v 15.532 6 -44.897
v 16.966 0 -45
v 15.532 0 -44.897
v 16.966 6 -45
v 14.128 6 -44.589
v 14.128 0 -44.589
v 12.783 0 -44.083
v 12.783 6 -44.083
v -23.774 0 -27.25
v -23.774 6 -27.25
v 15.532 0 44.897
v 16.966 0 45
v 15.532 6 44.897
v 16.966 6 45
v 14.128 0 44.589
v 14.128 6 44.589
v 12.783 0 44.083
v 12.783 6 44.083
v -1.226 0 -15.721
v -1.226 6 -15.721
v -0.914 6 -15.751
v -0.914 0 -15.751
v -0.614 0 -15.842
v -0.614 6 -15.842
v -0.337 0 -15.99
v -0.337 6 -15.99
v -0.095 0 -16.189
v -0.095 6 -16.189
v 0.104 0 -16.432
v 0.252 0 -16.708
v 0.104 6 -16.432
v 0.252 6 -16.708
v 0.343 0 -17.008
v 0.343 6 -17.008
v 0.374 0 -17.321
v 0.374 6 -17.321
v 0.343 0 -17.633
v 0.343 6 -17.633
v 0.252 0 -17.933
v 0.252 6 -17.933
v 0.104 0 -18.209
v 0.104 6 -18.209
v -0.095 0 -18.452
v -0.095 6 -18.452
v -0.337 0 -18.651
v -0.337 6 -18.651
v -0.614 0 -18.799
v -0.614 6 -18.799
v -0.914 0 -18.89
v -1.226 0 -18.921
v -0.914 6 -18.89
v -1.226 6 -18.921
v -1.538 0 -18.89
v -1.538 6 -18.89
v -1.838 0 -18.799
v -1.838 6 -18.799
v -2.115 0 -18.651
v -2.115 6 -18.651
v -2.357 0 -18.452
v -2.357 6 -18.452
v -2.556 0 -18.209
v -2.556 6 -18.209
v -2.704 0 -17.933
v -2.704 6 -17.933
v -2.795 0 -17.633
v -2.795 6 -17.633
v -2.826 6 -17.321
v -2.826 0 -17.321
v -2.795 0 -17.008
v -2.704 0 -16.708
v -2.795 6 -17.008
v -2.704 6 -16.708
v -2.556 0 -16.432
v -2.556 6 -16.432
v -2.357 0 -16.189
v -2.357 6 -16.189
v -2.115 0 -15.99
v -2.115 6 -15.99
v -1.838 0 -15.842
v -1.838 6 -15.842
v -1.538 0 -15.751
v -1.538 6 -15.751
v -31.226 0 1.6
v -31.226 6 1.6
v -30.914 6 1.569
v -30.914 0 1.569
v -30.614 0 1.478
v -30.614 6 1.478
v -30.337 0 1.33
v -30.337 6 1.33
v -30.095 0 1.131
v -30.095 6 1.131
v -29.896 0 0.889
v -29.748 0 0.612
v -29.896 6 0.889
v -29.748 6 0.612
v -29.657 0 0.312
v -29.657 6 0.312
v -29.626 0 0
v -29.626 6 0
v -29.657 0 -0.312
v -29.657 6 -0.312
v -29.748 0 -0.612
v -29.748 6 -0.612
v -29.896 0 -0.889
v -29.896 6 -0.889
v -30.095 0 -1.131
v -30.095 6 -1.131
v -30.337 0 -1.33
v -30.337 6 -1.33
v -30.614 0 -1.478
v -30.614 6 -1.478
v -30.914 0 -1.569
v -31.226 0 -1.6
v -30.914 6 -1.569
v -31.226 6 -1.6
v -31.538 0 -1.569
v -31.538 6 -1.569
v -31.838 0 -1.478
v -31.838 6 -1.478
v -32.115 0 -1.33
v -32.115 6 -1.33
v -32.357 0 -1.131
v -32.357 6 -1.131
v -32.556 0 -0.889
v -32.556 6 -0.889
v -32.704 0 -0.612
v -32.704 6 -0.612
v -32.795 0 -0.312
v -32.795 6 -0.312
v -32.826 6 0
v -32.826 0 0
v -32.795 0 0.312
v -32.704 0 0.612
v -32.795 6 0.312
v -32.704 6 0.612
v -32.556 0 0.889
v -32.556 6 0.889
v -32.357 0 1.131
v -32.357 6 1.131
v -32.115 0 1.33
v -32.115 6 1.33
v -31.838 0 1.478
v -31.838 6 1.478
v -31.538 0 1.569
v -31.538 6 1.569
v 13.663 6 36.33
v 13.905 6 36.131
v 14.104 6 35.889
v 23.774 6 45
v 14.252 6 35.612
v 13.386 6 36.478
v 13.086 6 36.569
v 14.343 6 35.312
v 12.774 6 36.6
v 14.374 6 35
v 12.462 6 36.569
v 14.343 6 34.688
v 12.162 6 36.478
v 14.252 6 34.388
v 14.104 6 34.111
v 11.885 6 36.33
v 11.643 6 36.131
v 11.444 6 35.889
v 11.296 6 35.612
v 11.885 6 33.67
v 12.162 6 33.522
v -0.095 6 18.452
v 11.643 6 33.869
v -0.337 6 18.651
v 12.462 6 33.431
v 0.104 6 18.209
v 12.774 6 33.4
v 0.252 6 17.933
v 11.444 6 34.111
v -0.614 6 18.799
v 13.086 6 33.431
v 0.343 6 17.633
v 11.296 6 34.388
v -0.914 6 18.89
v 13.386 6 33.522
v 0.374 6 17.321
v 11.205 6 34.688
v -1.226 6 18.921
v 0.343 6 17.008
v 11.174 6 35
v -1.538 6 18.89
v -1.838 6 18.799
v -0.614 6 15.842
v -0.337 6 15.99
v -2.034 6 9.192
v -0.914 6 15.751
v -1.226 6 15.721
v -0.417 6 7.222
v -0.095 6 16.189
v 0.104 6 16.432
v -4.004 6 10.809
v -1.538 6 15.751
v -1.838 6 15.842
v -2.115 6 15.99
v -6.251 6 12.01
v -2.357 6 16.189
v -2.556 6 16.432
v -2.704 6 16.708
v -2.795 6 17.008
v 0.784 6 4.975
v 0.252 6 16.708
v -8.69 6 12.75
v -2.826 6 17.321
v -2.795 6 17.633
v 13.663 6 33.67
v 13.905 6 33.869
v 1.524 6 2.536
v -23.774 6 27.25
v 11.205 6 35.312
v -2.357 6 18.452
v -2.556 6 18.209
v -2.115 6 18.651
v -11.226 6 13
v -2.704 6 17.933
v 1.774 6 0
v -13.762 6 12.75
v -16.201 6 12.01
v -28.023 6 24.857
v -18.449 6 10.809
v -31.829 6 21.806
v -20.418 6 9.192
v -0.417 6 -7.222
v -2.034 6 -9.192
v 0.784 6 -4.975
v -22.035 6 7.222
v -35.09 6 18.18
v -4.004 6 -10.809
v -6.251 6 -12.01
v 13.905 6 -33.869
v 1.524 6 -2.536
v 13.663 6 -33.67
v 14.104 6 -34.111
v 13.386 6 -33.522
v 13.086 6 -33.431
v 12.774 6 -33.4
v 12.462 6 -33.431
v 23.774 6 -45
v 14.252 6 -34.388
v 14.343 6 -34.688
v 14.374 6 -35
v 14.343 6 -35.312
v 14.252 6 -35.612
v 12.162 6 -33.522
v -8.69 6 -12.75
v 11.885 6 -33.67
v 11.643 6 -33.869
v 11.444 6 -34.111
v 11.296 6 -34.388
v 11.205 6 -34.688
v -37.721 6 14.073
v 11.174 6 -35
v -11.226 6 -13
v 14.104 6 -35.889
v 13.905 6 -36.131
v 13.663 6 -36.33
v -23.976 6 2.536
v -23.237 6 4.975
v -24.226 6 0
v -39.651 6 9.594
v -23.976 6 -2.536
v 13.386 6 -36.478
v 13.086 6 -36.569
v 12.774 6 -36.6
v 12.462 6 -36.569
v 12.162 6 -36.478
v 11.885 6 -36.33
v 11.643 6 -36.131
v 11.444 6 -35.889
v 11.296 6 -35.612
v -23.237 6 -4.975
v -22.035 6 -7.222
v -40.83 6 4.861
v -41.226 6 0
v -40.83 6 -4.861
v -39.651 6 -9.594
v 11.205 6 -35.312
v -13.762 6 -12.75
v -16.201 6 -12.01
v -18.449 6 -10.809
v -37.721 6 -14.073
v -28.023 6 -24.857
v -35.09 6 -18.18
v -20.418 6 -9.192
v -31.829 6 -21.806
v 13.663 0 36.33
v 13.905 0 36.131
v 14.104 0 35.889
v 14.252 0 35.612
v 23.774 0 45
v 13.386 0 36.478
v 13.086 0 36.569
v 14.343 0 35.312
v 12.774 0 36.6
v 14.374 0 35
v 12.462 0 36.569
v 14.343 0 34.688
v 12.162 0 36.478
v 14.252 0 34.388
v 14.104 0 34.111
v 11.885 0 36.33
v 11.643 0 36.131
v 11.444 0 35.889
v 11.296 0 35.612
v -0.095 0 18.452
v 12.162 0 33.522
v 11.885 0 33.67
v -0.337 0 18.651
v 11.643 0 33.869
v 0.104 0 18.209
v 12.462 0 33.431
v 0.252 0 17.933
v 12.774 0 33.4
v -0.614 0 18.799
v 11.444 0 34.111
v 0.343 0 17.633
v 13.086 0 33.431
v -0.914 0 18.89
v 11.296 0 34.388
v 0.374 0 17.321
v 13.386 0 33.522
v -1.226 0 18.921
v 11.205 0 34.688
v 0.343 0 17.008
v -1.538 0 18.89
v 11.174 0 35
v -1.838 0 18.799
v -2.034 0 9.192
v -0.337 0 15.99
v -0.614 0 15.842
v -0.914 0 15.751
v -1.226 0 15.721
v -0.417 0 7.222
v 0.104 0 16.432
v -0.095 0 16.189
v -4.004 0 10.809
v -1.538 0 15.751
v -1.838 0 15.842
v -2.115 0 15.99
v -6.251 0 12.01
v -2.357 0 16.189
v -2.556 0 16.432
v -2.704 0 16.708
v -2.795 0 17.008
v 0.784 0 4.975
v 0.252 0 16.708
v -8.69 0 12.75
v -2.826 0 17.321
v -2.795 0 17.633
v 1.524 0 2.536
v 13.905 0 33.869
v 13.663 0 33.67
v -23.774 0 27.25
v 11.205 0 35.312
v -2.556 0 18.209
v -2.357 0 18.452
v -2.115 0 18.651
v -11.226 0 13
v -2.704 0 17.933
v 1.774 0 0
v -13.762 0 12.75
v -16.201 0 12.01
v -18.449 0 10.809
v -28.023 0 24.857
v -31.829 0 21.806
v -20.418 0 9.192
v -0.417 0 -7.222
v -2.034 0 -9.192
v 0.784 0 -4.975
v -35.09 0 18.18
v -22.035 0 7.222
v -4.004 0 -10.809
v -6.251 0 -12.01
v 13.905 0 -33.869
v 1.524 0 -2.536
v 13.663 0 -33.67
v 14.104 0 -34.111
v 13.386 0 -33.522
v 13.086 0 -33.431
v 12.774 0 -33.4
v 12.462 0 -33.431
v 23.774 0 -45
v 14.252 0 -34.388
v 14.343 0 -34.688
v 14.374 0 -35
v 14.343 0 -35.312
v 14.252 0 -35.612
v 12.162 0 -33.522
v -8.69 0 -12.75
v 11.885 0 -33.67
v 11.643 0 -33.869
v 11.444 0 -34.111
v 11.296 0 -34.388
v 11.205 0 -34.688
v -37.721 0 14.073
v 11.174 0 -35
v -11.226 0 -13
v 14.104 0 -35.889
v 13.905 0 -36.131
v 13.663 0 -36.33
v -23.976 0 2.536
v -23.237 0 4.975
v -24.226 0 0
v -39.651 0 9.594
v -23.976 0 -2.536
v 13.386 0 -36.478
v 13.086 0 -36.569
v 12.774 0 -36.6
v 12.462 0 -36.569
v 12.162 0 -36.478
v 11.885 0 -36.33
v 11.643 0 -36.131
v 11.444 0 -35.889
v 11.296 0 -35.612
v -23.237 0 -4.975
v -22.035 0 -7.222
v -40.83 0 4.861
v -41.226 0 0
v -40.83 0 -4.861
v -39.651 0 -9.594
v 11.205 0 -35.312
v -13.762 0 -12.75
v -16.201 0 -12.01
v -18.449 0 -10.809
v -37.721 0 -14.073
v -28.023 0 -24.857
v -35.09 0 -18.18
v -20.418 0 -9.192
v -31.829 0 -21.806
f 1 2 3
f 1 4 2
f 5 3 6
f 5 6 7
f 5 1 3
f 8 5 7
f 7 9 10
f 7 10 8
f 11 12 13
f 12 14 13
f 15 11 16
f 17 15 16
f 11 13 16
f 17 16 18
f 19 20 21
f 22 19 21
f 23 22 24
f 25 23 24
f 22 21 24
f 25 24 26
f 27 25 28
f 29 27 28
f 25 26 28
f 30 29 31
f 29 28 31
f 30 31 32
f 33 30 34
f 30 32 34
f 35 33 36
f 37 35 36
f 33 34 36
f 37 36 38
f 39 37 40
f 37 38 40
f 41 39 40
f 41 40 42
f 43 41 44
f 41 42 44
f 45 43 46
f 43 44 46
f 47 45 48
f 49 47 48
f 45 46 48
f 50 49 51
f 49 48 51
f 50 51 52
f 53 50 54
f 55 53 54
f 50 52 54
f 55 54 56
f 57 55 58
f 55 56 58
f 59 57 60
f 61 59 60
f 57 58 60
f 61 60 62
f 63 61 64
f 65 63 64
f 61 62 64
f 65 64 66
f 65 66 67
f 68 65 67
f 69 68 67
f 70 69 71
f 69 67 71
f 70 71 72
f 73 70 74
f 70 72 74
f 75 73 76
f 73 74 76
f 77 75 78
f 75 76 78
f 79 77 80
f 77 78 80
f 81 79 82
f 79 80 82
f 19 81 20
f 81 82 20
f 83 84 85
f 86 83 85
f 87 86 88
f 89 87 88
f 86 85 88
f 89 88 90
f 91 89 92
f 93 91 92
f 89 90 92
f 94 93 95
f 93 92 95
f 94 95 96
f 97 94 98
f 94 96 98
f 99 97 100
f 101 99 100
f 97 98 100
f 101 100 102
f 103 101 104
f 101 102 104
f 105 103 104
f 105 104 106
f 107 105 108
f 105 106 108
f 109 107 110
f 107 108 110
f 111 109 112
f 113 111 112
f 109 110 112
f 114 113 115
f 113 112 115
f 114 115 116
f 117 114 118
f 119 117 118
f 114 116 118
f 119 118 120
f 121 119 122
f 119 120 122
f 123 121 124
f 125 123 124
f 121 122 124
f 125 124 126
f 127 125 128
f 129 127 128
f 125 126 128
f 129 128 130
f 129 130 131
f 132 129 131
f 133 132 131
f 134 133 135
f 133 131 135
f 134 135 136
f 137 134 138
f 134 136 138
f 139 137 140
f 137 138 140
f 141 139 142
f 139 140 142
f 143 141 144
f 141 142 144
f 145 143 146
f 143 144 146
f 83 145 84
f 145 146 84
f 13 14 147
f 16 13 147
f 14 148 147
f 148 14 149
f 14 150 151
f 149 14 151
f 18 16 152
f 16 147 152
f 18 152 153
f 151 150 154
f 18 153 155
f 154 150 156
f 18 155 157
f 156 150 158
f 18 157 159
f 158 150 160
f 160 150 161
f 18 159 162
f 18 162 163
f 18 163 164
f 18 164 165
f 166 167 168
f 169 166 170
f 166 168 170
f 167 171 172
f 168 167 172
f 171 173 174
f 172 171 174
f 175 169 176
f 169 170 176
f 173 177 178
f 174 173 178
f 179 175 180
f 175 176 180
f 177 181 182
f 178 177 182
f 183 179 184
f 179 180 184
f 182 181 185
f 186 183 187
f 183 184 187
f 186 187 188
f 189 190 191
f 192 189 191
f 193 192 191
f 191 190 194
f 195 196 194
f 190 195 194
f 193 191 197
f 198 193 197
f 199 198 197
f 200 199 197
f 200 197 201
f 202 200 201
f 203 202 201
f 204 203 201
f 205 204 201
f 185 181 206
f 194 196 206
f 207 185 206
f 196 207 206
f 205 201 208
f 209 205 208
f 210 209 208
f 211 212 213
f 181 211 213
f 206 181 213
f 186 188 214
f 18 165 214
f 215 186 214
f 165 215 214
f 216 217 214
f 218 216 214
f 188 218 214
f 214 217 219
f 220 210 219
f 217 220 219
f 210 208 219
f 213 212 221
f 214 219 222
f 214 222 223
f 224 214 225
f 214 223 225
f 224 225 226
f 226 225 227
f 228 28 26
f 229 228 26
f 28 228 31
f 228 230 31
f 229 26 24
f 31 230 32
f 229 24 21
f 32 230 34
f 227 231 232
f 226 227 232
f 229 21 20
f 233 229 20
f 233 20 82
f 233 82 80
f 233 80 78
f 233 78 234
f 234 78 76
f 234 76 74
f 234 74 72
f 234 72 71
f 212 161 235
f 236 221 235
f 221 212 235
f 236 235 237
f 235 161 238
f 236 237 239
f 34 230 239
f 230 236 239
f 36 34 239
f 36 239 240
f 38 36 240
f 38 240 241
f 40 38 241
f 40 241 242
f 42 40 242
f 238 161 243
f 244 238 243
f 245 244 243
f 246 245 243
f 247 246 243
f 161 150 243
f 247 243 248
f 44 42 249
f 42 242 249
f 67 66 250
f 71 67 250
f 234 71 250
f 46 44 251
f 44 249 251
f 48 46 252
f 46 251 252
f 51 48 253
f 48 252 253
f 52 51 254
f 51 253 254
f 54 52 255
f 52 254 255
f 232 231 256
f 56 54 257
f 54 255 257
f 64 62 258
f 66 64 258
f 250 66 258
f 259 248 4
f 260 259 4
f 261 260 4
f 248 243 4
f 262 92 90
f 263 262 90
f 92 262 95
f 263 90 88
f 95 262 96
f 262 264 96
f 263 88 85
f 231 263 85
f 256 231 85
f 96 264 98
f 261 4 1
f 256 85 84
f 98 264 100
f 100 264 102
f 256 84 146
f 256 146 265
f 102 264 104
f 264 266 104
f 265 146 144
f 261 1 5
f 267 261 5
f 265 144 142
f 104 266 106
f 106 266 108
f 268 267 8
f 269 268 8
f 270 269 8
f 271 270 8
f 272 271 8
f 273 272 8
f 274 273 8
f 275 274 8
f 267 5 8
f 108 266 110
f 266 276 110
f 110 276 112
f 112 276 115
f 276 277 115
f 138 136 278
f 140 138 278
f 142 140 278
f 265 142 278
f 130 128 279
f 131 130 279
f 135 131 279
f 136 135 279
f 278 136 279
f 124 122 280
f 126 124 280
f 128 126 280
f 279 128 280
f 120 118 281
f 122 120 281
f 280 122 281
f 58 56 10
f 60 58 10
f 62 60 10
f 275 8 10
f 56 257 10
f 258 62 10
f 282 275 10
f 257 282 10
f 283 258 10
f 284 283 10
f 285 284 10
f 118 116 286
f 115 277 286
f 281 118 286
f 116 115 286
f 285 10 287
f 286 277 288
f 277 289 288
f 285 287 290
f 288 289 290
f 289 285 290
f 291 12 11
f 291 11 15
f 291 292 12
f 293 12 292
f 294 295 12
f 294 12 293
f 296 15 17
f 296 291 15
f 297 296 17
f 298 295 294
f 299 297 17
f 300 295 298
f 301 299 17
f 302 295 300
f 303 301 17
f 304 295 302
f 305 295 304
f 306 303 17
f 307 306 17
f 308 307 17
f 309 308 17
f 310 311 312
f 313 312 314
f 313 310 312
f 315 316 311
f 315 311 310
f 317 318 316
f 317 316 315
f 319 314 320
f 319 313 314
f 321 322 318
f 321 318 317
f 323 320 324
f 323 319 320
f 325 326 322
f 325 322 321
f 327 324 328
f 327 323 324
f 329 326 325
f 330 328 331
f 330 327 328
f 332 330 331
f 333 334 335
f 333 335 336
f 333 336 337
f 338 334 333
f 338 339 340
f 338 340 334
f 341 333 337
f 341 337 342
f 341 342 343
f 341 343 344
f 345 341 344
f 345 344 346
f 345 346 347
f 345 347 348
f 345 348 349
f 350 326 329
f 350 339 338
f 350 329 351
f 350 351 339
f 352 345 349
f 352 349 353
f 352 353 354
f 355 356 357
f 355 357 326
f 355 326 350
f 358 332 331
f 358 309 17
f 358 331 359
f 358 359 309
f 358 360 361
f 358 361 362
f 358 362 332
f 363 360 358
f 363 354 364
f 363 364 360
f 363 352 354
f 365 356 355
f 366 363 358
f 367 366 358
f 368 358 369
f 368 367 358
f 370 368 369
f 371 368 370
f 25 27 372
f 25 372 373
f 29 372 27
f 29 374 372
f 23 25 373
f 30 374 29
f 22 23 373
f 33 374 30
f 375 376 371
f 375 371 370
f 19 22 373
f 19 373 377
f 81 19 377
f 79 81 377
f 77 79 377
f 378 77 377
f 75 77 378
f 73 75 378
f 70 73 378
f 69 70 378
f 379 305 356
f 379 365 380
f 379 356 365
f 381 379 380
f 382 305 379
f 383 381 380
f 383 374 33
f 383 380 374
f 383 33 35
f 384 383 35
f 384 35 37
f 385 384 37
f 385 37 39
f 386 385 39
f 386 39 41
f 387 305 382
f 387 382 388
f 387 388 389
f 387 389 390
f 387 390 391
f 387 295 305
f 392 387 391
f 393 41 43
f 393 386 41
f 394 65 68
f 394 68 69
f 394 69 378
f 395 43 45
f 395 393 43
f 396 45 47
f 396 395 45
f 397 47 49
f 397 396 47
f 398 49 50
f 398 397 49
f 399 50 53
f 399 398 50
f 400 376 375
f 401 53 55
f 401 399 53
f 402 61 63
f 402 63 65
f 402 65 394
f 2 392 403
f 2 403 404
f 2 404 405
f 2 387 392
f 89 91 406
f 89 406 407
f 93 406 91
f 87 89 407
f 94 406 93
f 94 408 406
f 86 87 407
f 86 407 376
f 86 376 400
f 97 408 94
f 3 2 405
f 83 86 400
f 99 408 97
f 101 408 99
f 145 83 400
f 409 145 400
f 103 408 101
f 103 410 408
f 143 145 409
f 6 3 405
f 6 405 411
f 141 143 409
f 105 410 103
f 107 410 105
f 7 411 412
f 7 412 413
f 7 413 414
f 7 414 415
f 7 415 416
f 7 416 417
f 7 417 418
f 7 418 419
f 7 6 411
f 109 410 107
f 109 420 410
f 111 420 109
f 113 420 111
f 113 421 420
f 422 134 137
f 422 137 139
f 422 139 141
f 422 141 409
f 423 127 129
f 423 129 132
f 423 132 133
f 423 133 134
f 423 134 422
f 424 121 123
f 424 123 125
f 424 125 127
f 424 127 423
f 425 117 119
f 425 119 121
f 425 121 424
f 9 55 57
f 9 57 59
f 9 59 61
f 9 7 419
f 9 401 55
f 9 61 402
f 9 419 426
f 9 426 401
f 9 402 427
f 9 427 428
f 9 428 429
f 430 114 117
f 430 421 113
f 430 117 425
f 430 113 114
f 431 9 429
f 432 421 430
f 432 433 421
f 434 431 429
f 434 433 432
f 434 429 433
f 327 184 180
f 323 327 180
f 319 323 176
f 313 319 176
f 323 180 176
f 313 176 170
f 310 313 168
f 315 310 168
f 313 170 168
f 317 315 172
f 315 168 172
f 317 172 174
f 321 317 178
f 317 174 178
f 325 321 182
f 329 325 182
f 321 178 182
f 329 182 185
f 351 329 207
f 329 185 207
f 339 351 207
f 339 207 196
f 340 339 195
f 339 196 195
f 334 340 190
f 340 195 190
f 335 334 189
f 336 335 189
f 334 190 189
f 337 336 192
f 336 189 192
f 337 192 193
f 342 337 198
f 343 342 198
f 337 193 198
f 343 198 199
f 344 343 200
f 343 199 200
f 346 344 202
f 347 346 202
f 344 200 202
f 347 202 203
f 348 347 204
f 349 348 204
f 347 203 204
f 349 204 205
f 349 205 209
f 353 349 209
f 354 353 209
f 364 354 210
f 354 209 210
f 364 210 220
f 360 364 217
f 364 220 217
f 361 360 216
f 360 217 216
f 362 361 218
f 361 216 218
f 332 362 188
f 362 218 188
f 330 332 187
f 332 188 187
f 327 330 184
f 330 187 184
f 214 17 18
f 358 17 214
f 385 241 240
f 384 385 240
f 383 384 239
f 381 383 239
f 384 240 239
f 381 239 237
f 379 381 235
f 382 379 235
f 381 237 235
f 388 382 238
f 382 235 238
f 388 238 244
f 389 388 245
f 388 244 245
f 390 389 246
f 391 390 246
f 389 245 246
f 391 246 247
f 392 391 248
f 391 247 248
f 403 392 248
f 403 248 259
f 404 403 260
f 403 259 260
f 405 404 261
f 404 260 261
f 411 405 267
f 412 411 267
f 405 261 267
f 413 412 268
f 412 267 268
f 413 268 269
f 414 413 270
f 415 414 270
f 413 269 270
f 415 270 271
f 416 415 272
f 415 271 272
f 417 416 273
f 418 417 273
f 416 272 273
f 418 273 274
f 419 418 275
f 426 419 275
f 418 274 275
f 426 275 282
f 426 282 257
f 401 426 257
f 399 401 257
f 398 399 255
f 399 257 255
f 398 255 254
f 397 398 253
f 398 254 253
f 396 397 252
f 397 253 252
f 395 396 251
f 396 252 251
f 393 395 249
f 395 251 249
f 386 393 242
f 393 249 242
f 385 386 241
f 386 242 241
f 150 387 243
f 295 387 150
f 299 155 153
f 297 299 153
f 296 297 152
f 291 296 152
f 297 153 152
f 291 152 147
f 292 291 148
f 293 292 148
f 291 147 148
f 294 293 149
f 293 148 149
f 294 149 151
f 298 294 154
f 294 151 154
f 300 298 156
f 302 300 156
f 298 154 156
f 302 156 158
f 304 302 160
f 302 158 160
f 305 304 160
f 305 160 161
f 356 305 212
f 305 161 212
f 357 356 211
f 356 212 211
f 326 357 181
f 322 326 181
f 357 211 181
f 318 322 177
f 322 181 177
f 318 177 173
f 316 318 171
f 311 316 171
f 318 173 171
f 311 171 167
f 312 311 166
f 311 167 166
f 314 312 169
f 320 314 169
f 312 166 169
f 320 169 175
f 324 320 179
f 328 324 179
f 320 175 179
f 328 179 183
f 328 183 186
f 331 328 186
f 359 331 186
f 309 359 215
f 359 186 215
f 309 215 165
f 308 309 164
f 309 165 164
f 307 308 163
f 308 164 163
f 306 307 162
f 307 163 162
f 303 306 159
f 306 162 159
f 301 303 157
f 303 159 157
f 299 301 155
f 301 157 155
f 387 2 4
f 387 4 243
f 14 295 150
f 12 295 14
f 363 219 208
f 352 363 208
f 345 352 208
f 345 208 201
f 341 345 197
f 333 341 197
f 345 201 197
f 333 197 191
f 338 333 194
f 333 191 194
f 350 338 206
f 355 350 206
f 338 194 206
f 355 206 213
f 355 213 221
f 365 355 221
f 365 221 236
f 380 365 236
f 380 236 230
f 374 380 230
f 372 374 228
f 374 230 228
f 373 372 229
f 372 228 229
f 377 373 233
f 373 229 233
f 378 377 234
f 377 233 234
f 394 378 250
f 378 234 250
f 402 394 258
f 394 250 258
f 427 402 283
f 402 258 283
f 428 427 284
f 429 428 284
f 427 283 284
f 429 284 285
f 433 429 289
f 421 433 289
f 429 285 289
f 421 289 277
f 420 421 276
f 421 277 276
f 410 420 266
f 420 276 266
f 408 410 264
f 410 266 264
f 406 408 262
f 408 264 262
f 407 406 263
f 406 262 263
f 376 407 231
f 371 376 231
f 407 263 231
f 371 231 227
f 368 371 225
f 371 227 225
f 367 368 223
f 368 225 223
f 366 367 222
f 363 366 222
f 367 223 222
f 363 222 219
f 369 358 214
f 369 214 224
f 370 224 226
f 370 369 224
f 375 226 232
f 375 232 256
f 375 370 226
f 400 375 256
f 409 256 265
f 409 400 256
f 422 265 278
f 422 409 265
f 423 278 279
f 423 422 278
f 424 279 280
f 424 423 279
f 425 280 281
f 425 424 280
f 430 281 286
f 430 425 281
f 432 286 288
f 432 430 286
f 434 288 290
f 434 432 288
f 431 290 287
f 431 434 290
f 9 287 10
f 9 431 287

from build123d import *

# Parameters (mm, degrees)
EXTRUDE_1_DEPTH     = 6
SKETCH_2_R          = 13
SKETCH_2_R_2        = 1.6
CUT_EXTRUDE_1_DEPTH = 6
FILLET_1_R          = 10
SKETCH_3_R          = 1.6
CUT_EXTRUDE_2_DEPTH = 6


with BuildPart() as part:
    # 草图1 → 凸台-拉伸1 (new body)
    with BuildSketch(Plane(origin=(0, 0, 0), x_dir=(1, 0, 0), z_dir=(0, 1, 0))):
        with BuildLine():
            Line((23.77389059, 45), (23.77389059, -45))
            Line((23.77389059, -45), (14.77389059, -45))
            Line((14.77389059, -45), (-23.77389059, -27.249829127))
            ThreePointArc((-23.77389059, -27.249829127), (-41.22610941, 0), (-23.77389059, 27.249829127))
            Line((-23.77389059, 27.249829127), (14.77389059, 45))
            Line((14.77389059, 45), (23.77389059, 45))
        make_face()
    extrude(amount=EXTRUDE_1_DEPTH)

    # 草图2 → 切除-拉伸1 (cut)
    with BuildSketch(Plane(origin=(0, 6, 0), x_dir=(1, 0, 0), z_dir=(0, 1, 0))):
        with Locations(Location((-11.22610941, 0, 0), (0, 0, 270))):
            Circle(SKETCH_2_R)
        with Locations(Location((-31.22610941, 0, 0), (0, 0, 270))):
            Circle(SKETCH_2_R_2)
        with Locations(Location((-1.22610941, -17.320508076, 0), (0, 0, 270))):
            Circle(SKETCH_2_R_2)
        with Locations(Location((-1.22610941, 17.320508076, 0), (0, 0, 270))):
            Circle(SKETCH_2_R_2)
    extrude(amount=-CUT_EXTRUDE_1_DEPTH, mode=Mode.SUBTRACT)

    # 圆角1
    fillet_1_edges = [part.edges().sort_by_distance(p)[0] for p in [
        (14.77389059, 3, -45),
        (14.77389059, 3, 45),
    ]]
    fillet(fillet_1_edges, radius=FILLET_1_R)

    # 草图3 → 切除-拉伸2 (cut)
    with BuildSketch(Plane(origin=(0, 6, 0), x_dir=(1, 0, 0), z_dir=(0, 1, 0))):
        with Locations(Location((12.77389059, 35, 0), (0, 0, 270))):
            Circle(SKETCH_3_R)
        with Locations(Location((12.77389059, -35, 0), (0, 0, 270))):
            Circle(SKETCH_3_R)
    extrude(amount=-CUT_EXTRUDE_2_DEPTH, mode=Mode.SUBTRACT)


solid = part.part
